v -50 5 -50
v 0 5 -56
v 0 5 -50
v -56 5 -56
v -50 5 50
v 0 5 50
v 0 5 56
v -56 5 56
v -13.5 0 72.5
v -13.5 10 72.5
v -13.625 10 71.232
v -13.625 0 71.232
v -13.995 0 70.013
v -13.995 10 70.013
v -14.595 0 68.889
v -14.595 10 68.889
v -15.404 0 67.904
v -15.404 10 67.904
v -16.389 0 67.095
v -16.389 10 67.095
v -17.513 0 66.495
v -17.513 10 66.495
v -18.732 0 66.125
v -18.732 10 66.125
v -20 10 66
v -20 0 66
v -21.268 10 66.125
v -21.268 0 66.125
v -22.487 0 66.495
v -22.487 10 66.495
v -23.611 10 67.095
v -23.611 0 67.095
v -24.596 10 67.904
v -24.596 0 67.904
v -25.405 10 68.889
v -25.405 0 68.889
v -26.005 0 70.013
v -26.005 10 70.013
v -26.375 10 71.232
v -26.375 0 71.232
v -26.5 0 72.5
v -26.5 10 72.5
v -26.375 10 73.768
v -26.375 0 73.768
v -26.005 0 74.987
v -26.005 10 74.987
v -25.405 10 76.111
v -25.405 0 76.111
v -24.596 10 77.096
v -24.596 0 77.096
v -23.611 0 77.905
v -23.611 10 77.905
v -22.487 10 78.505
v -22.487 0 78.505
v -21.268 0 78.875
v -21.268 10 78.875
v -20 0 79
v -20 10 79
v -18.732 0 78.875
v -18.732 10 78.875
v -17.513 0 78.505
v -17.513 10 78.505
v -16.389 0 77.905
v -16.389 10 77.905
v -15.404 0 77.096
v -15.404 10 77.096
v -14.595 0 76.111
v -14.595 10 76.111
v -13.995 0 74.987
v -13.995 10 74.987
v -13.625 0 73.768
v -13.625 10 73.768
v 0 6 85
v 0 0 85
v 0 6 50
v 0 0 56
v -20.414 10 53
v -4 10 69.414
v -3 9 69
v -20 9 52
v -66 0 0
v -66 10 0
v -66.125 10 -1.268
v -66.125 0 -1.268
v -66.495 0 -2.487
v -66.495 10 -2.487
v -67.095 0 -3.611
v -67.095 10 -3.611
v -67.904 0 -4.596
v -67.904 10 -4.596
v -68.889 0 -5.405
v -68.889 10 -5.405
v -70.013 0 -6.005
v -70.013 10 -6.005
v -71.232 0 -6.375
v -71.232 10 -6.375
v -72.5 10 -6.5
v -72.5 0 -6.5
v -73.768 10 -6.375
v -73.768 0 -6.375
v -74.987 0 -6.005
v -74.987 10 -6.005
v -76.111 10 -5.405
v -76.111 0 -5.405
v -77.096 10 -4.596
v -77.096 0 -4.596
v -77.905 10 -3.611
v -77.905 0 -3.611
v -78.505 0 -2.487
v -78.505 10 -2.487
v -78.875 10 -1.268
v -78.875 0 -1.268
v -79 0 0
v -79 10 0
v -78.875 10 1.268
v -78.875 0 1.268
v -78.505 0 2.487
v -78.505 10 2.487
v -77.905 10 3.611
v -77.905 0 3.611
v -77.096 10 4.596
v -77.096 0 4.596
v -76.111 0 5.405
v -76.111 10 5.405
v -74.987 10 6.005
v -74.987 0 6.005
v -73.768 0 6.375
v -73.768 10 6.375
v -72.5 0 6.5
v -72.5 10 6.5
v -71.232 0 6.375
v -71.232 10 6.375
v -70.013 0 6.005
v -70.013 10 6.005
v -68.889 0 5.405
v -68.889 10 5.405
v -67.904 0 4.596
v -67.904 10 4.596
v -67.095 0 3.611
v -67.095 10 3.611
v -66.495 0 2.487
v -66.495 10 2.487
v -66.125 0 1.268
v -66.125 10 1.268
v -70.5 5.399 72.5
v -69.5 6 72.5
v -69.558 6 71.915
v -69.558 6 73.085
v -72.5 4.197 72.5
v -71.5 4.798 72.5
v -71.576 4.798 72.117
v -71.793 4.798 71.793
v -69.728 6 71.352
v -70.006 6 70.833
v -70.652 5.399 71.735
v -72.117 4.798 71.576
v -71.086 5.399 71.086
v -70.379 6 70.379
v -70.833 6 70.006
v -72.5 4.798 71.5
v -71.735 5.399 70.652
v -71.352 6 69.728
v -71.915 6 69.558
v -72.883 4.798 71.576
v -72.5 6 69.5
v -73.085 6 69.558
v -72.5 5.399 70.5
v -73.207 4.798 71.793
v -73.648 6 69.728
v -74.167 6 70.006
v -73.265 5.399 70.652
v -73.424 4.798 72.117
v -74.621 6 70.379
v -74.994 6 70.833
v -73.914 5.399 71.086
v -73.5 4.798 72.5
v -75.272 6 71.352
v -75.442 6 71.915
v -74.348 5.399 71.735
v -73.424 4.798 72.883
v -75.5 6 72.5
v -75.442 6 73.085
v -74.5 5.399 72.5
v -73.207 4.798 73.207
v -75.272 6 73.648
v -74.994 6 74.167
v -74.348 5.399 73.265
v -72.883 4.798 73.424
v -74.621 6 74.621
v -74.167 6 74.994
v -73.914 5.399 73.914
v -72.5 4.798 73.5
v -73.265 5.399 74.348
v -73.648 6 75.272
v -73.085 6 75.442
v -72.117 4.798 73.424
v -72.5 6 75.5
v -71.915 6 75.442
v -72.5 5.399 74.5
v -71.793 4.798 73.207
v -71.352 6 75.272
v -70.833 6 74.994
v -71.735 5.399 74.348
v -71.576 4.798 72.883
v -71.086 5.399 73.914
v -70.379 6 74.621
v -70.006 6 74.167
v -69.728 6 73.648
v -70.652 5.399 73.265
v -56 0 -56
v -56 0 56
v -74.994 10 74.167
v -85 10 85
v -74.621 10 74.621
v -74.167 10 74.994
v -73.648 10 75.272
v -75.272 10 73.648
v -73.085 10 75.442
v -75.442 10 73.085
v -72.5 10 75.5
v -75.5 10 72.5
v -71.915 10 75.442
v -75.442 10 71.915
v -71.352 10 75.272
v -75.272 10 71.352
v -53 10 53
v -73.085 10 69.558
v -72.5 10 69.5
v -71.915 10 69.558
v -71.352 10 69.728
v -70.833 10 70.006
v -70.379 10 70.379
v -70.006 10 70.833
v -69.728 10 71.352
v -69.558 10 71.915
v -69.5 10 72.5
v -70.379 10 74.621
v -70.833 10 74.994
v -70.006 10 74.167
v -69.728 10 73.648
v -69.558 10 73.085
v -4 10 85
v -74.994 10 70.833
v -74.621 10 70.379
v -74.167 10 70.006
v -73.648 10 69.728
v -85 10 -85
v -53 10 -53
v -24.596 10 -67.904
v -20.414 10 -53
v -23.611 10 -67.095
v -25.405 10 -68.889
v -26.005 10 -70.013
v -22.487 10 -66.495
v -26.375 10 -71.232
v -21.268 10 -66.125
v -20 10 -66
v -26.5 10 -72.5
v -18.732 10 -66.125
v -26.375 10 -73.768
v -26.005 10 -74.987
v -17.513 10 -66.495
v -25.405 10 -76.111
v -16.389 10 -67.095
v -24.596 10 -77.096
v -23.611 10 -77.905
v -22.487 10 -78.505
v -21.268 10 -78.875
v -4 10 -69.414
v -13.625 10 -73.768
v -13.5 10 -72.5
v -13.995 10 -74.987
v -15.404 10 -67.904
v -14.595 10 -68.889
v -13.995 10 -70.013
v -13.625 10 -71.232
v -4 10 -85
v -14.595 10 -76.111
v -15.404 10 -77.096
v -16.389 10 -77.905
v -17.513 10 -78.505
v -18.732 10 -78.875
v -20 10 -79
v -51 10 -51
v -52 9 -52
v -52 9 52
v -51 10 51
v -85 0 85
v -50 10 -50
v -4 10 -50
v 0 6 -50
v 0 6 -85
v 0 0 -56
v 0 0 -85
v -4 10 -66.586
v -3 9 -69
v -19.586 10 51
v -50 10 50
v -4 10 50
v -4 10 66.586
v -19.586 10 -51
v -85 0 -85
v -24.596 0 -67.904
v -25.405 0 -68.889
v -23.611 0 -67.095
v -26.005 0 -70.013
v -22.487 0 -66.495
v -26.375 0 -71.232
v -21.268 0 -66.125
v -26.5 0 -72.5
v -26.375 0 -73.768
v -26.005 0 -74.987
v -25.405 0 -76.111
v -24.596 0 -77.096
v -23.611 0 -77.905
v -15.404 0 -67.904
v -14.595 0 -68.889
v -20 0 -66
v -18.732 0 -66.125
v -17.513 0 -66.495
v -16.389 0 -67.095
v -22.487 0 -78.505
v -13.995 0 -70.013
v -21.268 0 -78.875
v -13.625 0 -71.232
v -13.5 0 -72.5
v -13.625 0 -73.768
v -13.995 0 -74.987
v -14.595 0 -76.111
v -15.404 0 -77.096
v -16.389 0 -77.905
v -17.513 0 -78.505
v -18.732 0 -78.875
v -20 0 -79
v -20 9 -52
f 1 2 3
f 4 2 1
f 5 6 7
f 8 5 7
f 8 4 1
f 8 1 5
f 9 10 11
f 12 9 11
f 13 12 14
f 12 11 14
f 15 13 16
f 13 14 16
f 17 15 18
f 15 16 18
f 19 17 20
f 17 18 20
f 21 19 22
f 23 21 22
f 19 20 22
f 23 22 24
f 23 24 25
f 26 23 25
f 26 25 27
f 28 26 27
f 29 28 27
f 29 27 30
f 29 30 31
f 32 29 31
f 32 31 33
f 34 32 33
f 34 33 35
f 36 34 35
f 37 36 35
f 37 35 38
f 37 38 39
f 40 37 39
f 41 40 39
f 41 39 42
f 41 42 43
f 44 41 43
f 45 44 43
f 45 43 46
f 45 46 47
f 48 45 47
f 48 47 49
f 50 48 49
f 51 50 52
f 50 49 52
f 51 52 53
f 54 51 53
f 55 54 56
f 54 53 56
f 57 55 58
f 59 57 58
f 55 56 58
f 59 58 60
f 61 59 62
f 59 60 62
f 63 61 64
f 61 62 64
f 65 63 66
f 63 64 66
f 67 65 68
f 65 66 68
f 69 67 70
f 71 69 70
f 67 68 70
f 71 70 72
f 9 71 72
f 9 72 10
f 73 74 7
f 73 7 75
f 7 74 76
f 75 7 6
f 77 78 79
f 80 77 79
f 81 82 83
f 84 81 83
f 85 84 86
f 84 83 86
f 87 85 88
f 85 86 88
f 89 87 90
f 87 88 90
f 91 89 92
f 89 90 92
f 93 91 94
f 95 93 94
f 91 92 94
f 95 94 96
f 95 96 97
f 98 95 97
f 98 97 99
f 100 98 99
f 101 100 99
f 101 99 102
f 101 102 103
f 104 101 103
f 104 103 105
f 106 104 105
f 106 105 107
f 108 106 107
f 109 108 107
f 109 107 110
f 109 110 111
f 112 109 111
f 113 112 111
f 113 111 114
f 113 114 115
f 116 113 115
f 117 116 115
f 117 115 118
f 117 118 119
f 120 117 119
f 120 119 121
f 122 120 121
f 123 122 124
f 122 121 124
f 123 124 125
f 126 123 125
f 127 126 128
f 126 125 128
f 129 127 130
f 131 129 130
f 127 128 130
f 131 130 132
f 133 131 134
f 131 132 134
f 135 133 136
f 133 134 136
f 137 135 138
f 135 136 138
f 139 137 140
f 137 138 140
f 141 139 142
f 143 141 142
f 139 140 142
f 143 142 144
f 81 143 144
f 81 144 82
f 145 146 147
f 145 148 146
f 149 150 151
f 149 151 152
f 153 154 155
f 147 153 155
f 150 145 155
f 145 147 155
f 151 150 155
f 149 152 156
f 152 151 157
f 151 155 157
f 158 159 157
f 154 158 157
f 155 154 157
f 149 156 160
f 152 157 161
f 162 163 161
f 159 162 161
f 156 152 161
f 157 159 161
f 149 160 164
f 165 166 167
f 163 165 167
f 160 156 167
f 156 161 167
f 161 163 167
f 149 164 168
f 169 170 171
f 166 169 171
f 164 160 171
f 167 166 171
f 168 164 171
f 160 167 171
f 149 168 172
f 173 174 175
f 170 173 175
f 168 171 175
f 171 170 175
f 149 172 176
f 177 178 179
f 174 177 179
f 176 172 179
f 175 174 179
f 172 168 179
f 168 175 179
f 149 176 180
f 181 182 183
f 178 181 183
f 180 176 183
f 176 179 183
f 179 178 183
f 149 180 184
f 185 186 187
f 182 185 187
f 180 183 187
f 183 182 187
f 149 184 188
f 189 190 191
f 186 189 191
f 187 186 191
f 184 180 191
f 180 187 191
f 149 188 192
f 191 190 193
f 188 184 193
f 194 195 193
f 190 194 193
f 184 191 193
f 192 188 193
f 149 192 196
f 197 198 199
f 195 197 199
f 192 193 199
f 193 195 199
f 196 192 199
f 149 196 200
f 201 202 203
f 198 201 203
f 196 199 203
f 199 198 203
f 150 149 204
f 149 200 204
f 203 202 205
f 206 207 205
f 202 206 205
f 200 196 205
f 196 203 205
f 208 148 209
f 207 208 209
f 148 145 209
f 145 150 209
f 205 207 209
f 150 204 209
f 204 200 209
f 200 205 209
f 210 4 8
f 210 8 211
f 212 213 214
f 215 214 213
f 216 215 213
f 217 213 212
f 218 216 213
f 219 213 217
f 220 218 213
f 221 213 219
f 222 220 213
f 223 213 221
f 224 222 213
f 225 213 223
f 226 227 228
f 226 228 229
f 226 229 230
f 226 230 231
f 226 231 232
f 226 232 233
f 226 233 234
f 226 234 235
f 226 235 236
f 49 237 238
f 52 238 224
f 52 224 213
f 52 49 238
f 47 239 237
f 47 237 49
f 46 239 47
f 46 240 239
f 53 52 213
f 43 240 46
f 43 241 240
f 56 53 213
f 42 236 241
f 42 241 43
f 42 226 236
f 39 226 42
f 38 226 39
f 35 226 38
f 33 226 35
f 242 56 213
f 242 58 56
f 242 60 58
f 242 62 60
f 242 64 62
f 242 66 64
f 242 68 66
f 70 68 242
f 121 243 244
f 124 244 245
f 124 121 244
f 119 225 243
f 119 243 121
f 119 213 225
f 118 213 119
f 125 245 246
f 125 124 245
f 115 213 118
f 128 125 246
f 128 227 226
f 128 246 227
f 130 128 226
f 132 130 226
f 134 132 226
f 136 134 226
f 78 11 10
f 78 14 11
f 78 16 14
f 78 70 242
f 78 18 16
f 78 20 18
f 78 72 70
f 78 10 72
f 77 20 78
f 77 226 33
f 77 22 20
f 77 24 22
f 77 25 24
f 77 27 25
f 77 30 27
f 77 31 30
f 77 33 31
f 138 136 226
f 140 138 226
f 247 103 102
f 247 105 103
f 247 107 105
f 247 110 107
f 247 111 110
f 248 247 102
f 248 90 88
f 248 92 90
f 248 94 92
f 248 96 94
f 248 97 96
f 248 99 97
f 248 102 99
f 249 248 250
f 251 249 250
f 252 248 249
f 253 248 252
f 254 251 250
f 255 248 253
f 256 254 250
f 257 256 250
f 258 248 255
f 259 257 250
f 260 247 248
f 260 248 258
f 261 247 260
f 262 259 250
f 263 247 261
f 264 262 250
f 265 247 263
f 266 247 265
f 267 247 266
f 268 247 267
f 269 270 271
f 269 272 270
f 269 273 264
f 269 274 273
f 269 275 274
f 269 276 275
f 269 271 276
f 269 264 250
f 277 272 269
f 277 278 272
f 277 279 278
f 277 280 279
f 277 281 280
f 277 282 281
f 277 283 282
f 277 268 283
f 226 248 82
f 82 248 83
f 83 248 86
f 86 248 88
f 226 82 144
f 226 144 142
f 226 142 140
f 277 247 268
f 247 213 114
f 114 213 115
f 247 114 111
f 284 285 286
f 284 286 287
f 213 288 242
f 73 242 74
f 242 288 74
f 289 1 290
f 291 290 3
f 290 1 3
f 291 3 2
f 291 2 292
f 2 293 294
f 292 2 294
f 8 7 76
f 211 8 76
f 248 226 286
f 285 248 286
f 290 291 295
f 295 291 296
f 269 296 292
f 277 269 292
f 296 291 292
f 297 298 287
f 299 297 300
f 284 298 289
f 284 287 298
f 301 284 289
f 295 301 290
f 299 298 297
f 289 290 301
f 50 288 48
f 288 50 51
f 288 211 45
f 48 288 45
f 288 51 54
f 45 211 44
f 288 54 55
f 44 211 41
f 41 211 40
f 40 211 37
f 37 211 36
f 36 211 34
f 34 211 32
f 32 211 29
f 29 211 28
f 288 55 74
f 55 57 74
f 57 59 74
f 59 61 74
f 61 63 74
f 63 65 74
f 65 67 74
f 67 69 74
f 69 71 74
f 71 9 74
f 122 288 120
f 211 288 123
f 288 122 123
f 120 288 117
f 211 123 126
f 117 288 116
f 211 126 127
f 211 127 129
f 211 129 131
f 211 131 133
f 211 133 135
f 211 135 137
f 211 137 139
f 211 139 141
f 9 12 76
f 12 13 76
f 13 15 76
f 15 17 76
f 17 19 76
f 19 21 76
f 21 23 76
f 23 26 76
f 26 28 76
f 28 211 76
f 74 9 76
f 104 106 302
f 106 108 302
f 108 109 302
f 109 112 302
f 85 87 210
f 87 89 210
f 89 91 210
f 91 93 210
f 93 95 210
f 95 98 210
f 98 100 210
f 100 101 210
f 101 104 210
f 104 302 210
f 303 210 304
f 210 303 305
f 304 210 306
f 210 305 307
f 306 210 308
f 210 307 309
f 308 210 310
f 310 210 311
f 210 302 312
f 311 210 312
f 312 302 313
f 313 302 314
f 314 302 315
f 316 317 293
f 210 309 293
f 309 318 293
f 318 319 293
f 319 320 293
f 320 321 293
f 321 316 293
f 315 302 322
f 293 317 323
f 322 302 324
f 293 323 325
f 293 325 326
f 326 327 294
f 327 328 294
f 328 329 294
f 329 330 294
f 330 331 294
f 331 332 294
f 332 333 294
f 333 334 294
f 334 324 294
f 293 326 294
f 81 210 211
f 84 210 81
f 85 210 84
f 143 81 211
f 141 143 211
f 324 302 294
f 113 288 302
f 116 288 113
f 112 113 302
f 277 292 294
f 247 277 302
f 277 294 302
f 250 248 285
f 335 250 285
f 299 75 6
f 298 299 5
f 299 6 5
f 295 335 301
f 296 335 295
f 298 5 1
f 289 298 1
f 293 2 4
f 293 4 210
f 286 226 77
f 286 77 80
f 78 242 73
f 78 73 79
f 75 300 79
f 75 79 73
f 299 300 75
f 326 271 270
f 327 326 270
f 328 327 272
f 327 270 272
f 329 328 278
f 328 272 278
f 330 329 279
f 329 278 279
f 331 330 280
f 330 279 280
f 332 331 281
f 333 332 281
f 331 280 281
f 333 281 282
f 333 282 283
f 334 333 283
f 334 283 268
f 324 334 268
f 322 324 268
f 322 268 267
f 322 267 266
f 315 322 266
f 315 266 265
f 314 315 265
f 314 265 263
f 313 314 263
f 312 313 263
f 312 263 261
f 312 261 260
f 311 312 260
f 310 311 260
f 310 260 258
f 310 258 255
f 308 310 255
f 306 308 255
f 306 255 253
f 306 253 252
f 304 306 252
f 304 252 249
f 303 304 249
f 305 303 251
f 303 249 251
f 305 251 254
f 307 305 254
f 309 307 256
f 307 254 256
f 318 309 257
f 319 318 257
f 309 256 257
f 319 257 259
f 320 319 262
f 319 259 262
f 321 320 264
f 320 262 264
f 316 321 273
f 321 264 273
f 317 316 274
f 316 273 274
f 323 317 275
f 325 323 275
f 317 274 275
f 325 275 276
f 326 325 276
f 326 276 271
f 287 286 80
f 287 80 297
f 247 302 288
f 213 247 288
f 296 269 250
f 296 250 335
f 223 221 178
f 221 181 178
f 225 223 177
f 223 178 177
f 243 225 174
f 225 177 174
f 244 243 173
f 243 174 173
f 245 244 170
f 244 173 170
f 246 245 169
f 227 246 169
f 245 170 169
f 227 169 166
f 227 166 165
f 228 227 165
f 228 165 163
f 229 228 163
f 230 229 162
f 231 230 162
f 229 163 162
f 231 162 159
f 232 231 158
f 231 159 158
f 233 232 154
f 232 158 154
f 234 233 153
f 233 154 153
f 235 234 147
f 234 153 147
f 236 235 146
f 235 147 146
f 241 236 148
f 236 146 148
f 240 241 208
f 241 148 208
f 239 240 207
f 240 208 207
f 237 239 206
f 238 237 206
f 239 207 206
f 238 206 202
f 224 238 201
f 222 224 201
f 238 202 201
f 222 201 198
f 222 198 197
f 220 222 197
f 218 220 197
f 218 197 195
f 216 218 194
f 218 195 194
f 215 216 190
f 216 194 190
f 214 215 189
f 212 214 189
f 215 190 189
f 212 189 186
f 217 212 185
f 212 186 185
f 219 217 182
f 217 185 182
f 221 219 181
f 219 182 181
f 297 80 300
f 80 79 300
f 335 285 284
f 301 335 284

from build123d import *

# Parameters (mm, degrees)
BOSS_EXTRUDE1_DEPTH       = 10
SKETCH3_W                 = 6
SKETCH3_H                 = 5
CHAMFER1_SIZE             = 4
SKETCH10_R                = 6.5
CUT_EXTRUDE1_DEPTH        = 121.623380818
F_6_0MM_DOWEL_HOLE1_D     = 6
F_6_0MM_DOWEL_HOLE1_DEPTH = 4
F_6_0MM_DOWEL_HOLE1_TIP   = 1.802581857


with BuildPart() as part:
    # Sketch1 → Boss-Extrude1 (new body)
    with BuildSketch(Plane(origin=(0, 0, 0), x_dir=(1, 0, 0), z_dir=(0, 1, 0))):
        Polygon((0, -85), (0, -50), (-50, -50), (-50, 50), (0, 50), (0, 85), (-85, 85), (-85, -85), align=None)
    extrude(amount=BOSS_EXTRUDE1_DEPTH)

    # Cut-Sweep1: sweep along a path in Sketch4
    with BuildLine(Plane.XZ) as cut_sweep1_path:
        Line((0, 50), (-50, 50))
        Line((-50, 50), (-50, -50))
        Line((-50, -50), (0, -50))
    # Sketch3 → Cut-Sweep1 (sweep, cut)
    with BuildSketch(Plane(origin=(0, 0, 0), x_dir=(0, 0, -1), z_dir=(1, 0, 0))):
        with Locations((-53, 2.5)):
            Rectangle(SKETCH3_W, SKETCH3_H)
    sweep(path=cut_sweep1_path.line, transition=Transition.RIGHT, mode=Mode.SUBTRACT)

    # Chamfer1
    chamfer1_edges = [part.edges().sort_by_distance(p)[0] for p in [
        (0, 10, 67.5),
        (0, 10, -67.5),
    ]]
    chamfer(chamfer1_edges, length=CHAMFER1_SIZE)

    # Sketch10 → Cut-Extrude1 (cut, through all)
    with BuildSketch(Plane(origin=(0, 10, 0), x_dir=(1, 0, 0), z_dir=(0, 1, 0))):
        with Locations((-72.499960031, 0)):
            Circle(SKETCH10_R)
        with Locations((-20, -72.5)):
            Circle(SKETCH10_R)
        with Locations((-20, 72.5)):
            Circle(SKETCH10_R)
    extrude(amount=-CUT_EXTRUDE1_DEPTH, mode=Mode.SUBTRACT)

    # Ø6.0mm Dowel Hole1
    with Locations(Plane(origin=(0, 10, 0), x_dir=(1, 0, 0), z_dir=(0, 1, 0))):
        with Locations((-72.5, -72.5)):
            Hole(F_6_0MM_DOWEL_HOLE1_D / 2, depth=F_6_0MM_DOWEL_HOLE1_DEPTH)
            with Locations((0, 0, -(F_6_0MM_DOWEL_HOLE1_DEPTH + F_6_0MM_DOWEL_HOLE1_TIP / 2))):  # 118° drill point
                Cone(0, F_6_0MM_DOWEL_HOLE1_D / 2, F_6_0MM_DOWEL_HOLE1_TIP, mode=Mode.SUBTRACT)

    # Cut-Sweep2: sweep along a path in Sketch5
    with BuildLine(Plane(origin=(0, 10, 0), x_dir=(1, 0, 0), z_dir=(0, 1, 0))) as cut_sweep2_path:
        Line((0, -72), (-20, -52))
        Line((-20, -52), (-52, -52))
        Line((-52, -52), (-52, 52))
        Line((-52, 52), (-20, 52))
        Line((-20, 52), (0, 72))
    # Sketch9 → Cut-Sweep2 (sweep, cut)
    with BuildSketch(Plane(origin=(36, 0, 36), x_dir=(0, -1, 0), z_dir=(0.7071067811865462, 0, 0.7071067811865489))):
        Polygon((-10, -50.911688245), (-10, -51.911688245), (-9, -50.911688245), (-10, -49.911688245), align=None)
    sweep(path=cut_sweep2_path.line, transition=Transition.RIGHT, mode=Mode.SUBTRACT)


solid = part.part
